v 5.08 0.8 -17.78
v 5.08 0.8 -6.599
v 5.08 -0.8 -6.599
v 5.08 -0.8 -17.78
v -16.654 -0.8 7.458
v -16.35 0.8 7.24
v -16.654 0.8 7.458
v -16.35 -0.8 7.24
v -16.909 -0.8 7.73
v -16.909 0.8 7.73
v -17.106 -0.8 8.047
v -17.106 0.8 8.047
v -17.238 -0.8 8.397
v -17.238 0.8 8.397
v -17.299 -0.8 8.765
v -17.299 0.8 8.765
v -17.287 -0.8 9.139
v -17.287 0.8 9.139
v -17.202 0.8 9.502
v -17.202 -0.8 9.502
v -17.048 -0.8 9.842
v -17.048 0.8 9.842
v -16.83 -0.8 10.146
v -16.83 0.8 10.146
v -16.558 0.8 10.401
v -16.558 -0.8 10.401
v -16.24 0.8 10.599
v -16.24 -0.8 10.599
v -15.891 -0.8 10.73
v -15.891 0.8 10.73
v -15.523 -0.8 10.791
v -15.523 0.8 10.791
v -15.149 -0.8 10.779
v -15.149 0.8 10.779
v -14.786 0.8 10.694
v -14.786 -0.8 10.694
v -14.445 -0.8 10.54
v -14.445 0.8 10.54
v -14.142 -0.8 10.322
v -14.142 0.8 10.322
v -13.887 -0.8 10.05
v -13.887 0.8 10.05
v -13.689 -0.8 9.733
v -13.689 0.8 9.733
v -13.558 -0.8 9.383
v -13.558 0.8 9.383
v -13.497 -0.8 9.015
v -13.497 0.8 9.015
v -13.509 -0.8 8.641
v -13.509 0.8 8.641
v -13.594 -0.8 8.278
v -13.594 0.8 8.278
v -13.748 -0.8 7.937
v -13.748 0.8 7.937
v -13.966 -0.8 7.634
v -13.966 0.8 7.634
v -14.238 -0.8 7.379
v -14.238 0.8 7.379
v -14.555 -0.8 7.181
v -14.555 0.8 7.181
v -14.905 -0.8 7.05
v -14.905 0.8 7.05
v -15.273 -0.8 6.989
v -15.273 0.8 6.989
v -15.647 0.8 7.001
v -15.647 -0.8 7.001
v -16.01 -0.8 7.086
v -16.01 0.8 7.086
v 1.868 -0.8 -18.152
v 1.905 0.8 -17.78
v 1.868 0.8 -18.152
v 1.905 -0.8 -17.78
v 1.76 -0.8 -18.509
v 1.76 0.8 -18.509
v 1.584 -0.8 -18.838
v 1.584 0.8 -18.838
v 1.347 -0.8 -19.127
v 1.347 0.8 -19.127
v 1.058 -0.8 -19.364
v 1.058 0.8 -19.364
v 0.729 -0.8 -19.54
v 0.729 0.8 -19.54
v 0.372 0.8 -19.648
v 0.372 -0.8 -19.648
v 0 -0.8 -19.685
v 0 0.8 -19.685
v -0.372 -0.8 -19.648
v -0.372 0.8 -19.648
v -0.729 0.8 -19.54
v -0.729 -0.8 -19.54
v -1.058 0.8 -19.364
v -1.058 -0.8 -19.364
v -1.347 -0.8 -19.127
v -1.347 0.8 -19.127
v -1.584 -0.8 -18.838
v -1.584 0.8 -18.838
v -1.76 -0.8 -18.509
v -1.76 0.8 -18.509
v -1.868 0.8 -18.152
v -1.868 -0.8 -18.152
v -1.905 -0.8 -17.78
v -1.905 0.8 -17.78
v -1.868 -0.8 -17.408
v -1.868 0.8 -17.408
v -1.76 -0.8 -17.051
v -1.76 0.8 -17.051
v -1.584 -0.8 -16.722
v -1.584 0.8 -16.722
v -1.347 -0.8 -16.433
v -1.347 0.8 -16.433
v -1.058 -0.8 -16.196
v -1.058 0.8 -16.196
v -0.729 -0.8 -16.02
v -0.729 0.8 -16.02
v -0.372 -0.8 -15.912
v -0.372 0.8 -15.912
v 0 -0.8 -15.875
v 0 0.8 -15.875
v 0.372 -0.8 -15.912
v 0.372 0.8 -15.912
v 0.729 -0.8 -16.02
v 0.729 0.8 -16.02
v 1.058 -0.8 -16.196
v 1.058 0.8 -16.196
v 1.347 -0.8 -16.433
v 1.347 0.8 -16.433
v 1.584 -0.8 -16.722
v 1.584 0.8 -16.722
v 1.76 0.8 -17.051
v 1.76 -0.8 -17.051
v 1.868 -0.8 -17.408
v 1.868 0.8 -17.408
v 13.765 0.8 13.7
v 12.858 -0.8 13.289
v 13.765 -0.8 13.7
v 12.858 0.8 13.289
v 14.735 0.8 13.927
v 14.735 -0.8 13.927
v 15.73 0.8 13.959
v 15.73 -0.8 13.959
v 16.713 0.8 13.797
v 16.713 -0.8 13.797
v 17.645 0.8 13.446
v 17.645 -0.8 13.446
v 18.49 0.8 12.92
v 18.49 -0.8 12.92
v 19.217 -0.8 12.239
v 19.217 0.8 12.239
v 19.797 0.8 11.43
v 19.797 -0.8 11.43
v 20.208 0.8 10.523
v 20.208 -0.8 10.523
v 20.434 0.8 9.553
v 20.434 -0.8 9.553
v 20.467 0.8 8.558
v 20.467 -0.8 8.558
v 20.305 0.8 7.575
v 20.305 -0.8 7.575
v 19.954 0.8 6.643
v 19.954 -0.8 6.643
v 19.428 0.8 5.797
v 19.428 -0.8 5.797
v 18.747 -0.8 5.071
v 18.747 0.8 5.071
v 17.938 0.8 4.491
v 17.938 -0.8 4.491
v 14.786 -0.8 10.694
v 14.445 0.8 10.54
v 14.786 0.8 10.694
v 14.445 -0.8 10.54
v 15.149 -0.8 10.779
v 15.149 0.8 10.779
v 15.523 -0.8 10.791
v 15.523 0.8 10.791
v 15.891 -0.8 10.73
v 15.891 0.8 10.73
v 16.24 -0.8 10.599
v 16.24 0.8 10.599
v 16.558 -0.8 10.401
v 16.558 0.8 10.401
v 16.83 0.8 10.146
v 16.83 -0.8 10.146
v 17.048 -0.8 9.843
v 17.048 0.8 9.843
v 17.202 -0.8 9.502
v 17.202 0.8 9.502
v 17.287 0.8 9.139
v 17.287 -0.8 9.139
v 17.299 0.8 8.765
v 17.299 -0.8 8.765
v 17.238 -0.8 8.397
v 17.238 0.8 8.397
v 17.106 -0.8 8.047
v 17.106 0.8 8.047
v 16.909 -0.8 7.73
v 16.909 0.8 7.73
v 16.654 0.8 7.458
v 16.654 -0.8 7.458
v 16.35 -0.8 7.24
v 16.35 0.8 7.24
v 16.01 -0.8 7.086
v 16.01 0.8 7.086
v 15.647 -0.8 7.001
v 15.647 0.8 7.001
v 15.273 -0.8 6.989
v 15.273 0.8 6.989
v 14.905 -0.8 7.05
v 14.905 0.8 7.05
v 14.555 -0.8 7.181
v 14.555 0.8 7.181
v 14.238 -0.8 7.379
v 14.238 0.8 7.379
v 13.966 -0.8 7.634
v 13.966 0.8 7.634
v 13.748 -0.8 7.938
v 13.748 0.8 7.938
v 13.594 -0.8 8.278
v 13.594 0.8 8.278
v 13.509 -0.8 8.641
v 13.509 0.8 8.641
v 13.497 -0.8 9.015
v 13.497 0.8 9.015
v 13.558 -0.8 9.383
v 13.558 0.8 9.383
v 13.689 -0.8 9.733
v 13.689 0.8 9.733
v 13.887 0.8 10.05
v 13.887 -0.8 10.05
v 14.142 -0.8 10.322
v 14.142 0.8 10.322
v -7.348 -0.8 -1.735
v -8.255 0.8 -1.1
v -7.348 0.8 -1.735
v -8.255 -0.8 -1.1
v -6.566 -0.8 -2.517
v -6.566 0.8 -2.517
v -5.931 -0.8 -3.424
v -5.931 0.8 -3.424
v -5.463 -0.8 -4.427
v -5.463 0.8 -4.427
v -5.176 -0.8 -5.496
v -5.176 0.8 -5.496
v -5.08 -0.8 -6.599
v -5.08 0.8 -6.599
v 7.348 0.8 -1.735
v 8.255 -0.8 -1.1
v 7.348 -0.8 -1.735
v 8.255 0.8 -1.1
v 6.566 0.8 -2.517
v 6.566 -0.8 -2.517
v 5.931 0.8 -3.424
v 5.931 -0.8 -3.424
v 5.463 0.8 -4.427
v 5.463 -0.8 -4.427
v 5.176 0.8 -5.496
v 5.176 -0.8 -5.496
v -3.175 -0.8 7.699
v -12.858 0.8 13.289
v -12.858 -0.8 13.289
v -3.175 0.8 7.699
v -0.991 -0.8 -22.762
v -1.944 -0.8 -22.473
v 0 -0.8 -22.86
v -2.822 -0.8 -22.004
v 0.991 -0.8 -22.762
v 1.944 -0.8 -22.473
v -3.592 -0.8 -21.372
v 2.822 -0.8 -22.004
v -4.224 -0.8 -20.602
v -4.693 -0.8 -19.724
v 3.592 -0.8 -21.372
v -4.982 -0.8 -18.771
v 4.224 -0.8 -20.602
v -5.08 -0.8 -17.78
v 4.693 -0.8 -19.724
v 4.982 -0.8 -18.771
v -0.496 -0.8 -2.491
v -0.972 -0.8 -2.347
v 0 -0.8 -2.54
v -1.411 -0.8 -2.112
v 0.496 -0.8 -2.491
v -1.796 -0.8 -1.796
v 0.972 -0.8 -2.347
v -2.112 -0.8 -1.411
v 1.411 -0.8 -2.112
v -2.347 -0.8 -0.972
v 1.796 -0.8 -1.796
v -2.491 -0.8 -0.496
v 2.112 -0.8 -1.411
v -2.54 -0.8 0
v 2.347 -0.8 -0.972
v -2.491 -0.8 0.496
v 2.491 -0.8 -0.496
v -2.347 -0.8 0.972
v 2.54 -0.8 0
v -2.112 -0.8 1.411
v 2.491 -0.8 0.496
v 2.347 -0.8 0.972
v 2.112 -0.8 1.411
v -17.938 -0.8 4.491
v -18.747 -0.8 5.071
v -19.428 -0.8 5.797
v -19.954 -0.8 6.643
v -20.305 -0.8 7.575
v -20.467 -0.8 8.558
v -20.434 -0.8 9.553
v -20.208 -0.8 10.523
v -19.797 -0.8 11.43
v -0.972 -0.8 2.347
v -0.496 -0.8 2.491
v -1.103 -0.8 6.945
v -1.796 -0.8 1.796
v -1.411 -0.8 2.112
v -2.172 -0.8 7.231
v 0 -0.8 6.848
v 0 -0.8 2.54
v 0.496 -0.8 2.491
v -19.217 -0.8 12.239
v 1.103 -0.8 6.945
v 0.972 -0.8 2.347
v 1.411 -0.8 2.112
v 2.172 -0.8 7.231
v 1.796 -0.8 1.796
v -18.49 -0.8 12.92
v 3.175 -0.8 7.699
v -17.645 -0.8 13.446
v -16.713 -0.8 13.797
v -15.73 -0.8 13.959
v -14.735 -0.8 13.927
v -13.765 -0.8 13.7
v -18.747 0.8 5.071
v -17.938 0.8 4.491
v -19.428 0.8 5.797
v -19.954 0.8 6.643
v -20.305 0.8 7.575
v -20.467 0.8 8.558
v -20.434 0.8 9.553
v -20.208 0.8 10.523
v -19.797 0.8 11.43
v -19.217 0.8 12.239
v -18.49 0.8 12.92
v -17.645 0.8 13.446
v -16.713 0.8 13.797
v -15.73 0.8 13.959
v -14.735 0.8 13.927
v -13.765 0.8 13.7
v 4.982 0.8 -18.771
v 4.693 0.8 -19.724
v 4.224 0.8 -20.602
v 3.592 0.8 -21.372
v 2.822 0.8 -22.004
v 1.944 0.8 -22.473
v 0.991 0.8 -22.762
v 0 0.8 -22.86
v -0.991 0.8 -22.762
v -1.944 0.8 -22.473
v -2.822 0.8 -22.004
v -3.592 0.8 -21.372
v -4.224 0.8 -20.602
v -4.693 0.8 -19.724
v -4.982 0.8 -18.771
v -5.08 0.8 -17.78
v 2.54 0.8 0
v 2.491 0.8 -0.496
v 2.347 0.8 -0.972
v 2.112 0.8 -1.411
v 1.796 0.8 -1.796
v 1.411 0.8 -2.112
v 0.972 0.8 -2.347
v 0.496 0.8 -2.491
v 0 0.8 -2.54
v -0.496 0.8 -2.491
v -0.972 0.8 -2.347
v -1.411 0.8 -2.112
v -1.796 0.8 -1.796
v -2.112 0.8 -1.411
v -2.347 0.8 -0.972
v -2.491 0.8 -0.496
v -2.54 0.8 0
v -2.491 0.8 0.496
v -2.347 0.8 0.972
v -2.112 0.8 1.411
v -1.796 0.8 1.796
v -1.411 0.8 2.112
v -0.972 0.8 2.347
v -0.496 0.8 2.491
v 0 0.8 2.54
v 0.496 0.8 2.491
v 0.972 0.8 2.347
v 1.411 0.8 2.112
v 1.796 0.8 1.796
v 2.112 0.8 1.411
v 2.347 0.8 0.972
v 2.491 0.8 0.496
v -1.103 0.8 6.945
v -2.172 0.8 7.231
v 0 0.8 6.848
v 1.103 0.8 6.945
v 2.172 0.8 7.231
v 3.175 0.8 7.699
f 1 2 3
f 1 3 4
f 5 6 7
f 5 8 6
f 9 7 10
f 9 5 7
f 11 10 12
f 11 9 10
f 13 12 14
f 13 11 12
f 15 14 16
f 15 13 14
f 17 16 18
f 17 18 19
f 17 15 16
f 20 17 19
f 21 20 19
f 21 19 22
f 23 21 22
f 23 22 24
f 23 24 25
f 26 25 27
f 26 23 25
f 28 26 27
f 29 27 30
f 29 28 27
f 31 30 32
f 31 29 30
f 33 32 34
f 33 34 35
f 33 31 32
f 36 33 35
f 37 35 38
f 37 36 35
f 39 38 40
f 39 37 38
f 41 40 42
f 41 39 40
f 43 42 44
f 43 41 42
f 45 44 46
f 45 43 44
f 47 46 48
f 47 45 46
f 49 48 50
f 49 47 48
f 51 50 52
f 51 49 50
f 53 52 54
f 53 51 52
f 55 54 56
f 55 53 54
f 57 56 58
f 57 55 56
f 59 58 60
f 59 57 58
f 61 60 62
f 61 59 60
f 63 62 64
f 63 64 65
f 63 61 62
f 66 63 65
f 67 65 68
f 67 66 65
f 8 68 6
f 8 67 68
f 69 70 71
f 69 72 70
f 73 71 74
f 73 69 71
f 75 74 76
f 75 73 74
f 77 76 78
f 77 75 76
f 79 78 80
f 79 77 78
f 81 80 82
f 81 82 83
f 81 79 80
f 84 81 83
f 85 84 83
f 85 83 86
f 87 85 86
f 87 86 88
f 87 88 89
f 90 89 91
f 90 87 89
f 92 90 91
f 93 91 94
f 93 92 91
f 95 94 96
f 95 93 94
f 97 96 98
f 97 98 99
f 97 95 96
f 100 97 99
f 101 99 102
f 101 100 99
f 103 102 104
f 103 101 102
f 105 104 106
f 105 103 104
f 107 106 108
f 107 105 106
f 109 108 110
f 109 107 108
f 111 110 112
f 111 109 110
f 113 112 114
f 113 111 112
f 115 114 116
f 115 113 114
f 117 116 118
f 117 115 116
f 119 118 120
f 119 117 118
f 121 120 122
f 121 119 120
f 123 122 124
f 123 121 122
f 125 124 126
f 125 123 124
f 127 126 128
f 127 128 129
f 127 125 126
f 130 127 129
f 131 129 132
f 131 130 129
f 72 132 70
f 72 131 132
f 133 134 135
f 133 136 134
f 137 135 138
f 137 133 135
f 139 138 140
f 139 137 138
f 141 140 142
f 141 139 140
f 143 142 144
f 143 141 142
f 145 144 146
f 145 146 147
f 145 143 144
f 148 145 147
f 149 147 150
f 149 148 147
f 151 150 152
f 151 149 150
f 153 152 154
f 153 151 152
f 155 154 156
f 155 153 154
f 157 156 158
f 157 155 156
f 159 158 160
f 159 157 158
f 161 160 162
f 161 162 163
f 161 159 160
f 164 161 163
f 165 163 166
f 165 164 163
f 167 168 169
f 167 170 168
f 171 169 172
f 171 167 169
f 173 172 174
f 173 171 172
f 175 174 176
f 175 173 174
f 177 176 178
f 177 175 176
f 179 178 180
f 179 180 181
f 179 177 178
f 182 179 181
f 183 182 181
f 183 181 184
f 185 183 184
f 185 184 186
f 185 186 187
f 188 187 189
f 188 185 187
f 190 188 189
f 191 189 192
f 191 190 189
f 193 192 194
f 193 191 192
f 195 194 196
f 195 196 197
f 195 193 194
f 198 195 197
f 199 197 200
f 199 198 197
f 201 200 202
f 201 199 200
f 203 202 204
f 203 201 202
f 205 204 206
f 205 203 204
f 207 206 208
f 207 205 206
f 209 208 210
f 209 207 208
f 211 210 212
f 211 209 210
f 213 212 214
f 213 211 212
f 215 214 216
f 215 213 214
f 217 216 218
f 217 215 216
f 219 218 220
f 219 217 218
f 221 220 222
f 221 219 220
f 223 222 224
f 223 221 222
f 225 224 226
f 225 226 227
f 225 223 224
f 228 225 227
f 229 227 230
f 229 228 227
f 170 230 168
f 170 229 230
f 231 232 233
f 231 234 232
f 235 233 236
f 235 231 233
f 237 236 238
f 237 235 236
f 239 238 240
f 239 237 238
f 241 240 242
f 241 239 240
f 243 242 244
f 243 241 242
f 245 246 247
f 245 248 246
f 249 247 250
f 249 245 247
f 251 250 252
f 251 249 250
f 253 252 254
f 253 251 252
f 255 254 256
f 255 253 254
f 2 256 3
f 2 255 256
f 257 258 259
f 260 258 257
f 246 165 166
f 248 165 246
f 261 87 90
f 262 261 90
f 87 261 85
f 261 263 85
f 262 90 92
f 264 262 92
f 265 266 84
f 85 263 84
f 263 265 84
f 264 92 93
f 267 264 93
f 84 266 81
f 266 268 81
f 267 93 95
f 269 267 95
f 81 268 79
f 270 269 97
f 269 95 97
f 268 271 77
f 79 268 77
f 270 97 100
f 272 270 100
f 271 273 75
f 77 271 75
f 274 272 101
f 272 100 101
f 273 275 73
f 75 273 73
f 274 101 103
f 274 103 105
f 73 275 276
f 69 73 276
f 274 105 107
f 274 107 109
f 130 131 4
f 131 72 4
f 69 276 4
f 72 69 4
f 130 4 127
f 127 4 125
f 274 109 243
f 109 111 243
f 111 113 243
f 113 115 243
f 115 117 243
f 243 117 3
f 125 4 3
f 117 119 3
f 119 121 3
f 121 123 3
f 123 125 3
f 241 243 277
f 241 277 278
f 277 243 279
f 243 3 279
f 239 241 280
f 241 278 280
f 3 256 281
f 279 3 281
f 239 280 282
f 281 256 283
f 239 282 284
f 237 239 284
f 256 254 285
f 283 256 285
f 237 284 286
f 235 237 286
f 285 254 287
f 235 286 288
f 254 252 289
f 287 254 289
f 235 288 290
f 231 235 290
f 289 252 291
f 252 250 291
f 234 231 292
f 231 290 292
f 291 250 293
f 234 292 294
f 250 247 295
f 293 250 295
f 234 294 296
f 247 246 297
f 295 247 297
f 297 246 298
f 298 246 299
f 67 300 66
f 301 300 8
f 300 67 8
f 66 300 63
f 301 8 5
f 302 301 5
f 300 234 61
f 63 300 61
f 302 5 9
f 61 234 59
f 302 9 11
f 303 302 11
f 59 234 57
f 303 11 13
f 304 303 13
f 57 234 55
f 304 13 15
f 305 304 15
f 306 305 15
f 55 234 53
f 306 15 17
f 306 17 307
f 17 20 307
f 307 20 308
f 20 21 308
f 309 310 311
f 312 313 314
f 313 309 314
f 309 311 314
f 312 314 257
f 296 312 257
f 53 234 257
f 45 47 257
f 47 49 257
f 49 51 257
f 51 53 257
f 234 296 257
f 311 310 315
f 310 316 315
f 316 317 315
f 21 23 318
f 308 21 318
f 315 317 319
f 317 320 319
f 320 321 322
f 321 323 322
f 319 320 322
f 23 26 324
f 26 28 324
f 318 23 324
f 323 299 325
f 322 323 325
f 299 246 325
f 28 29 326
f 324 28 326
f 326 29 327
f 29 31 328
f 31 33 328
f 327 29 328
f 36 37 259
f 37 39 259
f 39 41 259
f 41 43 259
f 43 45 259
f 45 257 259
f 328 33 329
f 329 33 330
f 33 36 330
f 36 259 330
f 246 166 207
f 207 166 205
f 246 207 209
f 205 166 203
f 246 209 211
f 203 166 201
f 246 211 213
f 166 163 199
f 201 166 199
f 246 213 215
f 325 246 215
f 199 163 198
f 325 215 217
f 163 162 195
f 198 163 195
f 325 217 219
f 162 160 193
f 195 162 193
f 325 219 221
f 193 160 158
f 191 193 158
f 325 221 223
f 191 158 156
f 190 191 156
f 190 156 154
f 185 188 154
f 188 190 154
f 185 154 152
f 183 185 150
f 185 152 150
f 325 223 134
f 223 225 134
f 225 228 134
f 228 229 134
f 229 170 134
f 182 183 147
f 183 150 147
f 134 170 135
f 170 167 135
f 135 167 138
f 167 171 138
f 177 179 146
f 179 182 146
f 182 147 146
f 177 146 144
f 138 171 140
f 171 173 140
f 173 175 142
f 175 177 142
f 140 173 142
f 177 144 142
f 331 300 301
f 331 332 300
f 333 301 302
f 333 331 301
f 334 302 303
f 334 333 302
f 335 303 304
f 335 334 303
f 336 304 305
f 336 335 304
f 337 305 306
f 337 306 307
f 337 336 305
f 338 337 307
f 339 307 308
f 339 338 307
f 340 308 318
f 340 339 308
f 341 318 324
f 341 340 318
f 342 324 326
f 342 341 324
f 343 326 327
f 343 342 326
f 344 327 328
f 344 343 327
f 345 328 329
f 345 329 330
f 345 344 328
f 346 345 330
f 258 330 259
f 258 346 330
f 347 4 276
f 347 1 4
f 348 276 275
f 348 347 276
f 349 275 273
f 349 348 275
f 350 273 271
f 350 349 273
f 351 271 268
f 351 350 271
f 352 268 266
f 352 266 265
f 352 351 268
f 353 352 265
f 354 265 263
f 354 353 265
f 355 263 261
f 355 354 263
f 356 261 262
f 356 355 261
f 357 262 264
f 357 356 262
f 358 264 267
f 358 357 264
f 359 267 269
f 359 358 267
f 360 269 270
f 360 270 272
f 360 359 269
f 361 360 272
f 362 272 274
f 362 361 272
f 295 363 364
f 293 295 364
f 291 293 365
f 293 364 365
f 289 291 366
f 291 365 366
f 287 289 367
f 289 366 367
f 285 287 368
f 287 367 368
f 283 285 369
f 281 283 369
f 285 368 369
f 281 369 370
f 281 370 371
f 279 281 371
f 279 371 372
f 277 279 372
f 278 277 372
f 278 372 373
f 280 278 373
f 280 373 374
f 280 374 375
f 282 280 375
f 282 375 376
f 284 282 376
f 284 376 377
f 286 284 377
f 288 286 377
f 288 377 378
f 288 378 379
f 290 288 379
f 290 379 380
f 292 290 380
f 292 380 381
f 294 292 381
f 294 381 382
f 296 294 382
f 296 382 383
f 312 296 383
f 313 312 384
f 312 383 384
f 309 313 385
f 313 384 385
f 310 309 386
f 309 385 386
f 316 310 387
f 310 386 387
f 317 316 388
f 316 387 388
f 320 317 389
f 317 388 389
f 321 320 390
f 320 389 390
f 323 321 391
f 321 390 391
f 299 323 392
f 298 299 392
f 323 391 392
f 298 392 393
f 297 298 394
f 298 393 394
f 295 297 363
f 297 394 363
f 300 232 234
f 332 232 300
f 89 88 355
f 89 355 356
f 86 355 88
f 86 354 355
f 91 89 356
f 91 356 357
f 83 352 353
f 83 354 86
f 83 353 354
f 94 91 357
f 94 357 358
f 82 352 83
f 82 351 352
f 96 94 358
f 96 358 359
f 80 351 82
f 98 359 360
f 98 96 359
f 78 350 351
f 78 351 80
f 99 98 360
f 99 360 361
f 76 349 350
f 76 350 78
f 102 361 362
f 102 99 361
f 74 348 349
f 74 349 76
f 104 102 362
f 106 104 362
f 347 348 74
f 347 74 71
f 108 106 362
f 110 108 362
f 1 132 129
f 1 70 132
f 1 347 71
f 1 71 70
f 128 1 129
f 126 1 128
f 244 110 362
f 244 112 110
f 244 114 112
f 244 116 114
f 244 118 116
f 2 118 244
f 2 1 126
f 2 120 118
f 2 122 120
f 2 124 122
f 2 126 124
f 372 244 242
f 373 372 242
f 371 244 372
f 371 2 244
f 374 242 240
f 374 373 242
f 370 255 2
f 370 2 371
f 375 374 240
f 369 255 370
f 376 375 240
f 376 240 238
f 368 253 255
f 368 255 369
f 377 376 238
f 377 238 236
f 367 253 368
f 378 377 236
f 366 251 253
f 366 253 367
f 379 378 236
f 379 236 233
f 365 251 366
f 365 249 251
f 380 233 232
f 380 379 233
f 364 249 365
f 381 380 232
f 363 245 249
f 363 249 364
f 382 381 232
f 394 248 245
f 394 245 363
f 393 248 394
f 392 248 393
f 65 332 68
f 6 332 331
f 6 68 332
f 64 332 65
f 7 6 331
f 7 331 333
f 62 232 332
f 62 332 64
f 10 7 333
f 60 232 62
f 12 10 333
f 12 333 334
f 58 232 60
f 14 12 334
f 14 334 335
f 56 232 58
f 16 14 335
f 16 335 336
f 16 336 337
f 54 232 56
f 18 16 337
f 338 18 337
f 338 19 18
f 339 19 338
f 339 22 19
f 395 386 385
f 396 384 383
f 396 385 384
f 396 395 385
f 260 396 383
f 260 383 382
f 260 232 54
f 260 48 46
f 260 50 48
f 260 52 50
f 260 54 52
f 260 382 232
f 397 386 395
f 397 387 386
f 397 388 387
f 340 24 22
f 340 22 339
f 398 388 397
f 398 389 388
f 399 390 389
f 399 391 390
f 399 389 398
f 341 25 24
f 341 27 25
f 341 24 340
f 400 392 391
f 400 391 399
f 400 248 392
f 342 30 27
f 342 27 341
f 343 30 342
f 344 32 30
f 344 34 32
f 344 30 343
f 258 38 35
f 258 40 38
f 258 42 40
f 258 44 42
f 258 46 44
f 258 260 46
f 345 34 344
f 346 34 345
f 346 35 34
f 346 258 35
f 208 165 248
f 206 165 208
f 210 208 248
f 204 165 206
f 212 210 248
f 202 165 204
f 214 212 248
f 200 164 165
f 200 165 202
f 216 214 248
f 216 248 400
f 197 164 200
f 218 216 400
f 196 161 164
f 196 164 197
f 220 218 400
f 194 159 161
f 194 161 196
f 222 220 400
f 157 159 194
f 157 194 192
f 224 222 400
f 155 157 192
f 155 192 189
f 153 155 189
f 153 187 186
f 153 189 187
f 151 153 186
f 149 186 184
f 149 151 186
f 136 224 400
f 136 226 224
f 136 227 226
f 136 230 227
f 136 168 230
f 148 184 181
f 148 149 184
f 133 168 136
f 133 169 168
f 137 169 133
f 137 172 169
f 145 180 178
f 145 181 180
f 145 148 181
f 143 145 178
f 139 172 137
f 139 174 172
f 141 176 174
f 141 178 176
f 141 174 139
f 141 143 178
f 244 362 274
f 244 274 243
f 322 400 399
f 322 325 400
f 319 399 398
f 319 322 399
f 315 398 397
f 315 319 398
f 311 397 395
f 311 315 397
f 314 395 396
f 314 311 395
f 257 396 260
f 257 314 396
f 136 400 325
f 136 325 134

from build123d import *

# Parameters (mm, degrees)
SKETCH1_R           = 1.905
BOSS_EXTRUDE1_DEPTH = 0.8001
CIRPATTERN1_COUNT   = 3
SKETCH2_R           = 2.54
CUT_EXTRUDE1_DEPTH  = 2.6002
FILLET1_R           = 6.35


with BuildPart() as part:
    # Sketch1 → Boss-Extrude1 (new body, symmetric)
    with BuildSketch(Plane(origin=(0, 0, 0), x_dir=(1, 0, 0), z_dir=(0, 1, 0))):
        with BuildLine():
            Line((-5.08, 17.78), (-5.08, 0))
            Line((-5.08, 0), (5.08, 0))
            Line((5.08, 0), (5.08, 17.78))
            ThreePointArc((5.08, 17.78), (0, 22.86), (-5.08, 17.78))
        make_face()
        with Locations((0, 17.78)):
            Circle(SKETCH1_R, mode=Mode.SUBTRACT)
    boss_extrude1 = extrude(amount=BOSS_EXTRUDE1_DEPTH, both=True)

    # CirPattern1: Boss-Extrude1 ×3 about axis
    cirpattern1_axis = Axis((0, 0, 0), (0, 1, 0))
    for i in range(1, CIRPATTERN1_COUNT):
        add(boss_extrude1.rotate(cirpattern1_axis, i * 360 / CIRPATTERN1_COUNT))

    # Sketch2 → Cut-Extrude1 (cut, through all)
    with BuildSketch(Plane(origin=(0, 0.8001, 0), x_dir=(1, 0, 0), z_dir=(0, 1, 0))):
        Circle(SKETCH2_R)
    extrude(amount=-CUT_EXTRUDE1_DEPTH, mode=Mode.SUBTRACT)

    # Fillet1
    fillet1_edges = [part.edges().sort_by_distance(p)[0] for p in [
        (5.08, 0, -2.932939367),
        (-5.08, 0, -2.932939367),
        (0, 0, 5.865878735),
    ]]
    fillet(fillet1_edges, radius=FILLET1_R)


solid = part.part
